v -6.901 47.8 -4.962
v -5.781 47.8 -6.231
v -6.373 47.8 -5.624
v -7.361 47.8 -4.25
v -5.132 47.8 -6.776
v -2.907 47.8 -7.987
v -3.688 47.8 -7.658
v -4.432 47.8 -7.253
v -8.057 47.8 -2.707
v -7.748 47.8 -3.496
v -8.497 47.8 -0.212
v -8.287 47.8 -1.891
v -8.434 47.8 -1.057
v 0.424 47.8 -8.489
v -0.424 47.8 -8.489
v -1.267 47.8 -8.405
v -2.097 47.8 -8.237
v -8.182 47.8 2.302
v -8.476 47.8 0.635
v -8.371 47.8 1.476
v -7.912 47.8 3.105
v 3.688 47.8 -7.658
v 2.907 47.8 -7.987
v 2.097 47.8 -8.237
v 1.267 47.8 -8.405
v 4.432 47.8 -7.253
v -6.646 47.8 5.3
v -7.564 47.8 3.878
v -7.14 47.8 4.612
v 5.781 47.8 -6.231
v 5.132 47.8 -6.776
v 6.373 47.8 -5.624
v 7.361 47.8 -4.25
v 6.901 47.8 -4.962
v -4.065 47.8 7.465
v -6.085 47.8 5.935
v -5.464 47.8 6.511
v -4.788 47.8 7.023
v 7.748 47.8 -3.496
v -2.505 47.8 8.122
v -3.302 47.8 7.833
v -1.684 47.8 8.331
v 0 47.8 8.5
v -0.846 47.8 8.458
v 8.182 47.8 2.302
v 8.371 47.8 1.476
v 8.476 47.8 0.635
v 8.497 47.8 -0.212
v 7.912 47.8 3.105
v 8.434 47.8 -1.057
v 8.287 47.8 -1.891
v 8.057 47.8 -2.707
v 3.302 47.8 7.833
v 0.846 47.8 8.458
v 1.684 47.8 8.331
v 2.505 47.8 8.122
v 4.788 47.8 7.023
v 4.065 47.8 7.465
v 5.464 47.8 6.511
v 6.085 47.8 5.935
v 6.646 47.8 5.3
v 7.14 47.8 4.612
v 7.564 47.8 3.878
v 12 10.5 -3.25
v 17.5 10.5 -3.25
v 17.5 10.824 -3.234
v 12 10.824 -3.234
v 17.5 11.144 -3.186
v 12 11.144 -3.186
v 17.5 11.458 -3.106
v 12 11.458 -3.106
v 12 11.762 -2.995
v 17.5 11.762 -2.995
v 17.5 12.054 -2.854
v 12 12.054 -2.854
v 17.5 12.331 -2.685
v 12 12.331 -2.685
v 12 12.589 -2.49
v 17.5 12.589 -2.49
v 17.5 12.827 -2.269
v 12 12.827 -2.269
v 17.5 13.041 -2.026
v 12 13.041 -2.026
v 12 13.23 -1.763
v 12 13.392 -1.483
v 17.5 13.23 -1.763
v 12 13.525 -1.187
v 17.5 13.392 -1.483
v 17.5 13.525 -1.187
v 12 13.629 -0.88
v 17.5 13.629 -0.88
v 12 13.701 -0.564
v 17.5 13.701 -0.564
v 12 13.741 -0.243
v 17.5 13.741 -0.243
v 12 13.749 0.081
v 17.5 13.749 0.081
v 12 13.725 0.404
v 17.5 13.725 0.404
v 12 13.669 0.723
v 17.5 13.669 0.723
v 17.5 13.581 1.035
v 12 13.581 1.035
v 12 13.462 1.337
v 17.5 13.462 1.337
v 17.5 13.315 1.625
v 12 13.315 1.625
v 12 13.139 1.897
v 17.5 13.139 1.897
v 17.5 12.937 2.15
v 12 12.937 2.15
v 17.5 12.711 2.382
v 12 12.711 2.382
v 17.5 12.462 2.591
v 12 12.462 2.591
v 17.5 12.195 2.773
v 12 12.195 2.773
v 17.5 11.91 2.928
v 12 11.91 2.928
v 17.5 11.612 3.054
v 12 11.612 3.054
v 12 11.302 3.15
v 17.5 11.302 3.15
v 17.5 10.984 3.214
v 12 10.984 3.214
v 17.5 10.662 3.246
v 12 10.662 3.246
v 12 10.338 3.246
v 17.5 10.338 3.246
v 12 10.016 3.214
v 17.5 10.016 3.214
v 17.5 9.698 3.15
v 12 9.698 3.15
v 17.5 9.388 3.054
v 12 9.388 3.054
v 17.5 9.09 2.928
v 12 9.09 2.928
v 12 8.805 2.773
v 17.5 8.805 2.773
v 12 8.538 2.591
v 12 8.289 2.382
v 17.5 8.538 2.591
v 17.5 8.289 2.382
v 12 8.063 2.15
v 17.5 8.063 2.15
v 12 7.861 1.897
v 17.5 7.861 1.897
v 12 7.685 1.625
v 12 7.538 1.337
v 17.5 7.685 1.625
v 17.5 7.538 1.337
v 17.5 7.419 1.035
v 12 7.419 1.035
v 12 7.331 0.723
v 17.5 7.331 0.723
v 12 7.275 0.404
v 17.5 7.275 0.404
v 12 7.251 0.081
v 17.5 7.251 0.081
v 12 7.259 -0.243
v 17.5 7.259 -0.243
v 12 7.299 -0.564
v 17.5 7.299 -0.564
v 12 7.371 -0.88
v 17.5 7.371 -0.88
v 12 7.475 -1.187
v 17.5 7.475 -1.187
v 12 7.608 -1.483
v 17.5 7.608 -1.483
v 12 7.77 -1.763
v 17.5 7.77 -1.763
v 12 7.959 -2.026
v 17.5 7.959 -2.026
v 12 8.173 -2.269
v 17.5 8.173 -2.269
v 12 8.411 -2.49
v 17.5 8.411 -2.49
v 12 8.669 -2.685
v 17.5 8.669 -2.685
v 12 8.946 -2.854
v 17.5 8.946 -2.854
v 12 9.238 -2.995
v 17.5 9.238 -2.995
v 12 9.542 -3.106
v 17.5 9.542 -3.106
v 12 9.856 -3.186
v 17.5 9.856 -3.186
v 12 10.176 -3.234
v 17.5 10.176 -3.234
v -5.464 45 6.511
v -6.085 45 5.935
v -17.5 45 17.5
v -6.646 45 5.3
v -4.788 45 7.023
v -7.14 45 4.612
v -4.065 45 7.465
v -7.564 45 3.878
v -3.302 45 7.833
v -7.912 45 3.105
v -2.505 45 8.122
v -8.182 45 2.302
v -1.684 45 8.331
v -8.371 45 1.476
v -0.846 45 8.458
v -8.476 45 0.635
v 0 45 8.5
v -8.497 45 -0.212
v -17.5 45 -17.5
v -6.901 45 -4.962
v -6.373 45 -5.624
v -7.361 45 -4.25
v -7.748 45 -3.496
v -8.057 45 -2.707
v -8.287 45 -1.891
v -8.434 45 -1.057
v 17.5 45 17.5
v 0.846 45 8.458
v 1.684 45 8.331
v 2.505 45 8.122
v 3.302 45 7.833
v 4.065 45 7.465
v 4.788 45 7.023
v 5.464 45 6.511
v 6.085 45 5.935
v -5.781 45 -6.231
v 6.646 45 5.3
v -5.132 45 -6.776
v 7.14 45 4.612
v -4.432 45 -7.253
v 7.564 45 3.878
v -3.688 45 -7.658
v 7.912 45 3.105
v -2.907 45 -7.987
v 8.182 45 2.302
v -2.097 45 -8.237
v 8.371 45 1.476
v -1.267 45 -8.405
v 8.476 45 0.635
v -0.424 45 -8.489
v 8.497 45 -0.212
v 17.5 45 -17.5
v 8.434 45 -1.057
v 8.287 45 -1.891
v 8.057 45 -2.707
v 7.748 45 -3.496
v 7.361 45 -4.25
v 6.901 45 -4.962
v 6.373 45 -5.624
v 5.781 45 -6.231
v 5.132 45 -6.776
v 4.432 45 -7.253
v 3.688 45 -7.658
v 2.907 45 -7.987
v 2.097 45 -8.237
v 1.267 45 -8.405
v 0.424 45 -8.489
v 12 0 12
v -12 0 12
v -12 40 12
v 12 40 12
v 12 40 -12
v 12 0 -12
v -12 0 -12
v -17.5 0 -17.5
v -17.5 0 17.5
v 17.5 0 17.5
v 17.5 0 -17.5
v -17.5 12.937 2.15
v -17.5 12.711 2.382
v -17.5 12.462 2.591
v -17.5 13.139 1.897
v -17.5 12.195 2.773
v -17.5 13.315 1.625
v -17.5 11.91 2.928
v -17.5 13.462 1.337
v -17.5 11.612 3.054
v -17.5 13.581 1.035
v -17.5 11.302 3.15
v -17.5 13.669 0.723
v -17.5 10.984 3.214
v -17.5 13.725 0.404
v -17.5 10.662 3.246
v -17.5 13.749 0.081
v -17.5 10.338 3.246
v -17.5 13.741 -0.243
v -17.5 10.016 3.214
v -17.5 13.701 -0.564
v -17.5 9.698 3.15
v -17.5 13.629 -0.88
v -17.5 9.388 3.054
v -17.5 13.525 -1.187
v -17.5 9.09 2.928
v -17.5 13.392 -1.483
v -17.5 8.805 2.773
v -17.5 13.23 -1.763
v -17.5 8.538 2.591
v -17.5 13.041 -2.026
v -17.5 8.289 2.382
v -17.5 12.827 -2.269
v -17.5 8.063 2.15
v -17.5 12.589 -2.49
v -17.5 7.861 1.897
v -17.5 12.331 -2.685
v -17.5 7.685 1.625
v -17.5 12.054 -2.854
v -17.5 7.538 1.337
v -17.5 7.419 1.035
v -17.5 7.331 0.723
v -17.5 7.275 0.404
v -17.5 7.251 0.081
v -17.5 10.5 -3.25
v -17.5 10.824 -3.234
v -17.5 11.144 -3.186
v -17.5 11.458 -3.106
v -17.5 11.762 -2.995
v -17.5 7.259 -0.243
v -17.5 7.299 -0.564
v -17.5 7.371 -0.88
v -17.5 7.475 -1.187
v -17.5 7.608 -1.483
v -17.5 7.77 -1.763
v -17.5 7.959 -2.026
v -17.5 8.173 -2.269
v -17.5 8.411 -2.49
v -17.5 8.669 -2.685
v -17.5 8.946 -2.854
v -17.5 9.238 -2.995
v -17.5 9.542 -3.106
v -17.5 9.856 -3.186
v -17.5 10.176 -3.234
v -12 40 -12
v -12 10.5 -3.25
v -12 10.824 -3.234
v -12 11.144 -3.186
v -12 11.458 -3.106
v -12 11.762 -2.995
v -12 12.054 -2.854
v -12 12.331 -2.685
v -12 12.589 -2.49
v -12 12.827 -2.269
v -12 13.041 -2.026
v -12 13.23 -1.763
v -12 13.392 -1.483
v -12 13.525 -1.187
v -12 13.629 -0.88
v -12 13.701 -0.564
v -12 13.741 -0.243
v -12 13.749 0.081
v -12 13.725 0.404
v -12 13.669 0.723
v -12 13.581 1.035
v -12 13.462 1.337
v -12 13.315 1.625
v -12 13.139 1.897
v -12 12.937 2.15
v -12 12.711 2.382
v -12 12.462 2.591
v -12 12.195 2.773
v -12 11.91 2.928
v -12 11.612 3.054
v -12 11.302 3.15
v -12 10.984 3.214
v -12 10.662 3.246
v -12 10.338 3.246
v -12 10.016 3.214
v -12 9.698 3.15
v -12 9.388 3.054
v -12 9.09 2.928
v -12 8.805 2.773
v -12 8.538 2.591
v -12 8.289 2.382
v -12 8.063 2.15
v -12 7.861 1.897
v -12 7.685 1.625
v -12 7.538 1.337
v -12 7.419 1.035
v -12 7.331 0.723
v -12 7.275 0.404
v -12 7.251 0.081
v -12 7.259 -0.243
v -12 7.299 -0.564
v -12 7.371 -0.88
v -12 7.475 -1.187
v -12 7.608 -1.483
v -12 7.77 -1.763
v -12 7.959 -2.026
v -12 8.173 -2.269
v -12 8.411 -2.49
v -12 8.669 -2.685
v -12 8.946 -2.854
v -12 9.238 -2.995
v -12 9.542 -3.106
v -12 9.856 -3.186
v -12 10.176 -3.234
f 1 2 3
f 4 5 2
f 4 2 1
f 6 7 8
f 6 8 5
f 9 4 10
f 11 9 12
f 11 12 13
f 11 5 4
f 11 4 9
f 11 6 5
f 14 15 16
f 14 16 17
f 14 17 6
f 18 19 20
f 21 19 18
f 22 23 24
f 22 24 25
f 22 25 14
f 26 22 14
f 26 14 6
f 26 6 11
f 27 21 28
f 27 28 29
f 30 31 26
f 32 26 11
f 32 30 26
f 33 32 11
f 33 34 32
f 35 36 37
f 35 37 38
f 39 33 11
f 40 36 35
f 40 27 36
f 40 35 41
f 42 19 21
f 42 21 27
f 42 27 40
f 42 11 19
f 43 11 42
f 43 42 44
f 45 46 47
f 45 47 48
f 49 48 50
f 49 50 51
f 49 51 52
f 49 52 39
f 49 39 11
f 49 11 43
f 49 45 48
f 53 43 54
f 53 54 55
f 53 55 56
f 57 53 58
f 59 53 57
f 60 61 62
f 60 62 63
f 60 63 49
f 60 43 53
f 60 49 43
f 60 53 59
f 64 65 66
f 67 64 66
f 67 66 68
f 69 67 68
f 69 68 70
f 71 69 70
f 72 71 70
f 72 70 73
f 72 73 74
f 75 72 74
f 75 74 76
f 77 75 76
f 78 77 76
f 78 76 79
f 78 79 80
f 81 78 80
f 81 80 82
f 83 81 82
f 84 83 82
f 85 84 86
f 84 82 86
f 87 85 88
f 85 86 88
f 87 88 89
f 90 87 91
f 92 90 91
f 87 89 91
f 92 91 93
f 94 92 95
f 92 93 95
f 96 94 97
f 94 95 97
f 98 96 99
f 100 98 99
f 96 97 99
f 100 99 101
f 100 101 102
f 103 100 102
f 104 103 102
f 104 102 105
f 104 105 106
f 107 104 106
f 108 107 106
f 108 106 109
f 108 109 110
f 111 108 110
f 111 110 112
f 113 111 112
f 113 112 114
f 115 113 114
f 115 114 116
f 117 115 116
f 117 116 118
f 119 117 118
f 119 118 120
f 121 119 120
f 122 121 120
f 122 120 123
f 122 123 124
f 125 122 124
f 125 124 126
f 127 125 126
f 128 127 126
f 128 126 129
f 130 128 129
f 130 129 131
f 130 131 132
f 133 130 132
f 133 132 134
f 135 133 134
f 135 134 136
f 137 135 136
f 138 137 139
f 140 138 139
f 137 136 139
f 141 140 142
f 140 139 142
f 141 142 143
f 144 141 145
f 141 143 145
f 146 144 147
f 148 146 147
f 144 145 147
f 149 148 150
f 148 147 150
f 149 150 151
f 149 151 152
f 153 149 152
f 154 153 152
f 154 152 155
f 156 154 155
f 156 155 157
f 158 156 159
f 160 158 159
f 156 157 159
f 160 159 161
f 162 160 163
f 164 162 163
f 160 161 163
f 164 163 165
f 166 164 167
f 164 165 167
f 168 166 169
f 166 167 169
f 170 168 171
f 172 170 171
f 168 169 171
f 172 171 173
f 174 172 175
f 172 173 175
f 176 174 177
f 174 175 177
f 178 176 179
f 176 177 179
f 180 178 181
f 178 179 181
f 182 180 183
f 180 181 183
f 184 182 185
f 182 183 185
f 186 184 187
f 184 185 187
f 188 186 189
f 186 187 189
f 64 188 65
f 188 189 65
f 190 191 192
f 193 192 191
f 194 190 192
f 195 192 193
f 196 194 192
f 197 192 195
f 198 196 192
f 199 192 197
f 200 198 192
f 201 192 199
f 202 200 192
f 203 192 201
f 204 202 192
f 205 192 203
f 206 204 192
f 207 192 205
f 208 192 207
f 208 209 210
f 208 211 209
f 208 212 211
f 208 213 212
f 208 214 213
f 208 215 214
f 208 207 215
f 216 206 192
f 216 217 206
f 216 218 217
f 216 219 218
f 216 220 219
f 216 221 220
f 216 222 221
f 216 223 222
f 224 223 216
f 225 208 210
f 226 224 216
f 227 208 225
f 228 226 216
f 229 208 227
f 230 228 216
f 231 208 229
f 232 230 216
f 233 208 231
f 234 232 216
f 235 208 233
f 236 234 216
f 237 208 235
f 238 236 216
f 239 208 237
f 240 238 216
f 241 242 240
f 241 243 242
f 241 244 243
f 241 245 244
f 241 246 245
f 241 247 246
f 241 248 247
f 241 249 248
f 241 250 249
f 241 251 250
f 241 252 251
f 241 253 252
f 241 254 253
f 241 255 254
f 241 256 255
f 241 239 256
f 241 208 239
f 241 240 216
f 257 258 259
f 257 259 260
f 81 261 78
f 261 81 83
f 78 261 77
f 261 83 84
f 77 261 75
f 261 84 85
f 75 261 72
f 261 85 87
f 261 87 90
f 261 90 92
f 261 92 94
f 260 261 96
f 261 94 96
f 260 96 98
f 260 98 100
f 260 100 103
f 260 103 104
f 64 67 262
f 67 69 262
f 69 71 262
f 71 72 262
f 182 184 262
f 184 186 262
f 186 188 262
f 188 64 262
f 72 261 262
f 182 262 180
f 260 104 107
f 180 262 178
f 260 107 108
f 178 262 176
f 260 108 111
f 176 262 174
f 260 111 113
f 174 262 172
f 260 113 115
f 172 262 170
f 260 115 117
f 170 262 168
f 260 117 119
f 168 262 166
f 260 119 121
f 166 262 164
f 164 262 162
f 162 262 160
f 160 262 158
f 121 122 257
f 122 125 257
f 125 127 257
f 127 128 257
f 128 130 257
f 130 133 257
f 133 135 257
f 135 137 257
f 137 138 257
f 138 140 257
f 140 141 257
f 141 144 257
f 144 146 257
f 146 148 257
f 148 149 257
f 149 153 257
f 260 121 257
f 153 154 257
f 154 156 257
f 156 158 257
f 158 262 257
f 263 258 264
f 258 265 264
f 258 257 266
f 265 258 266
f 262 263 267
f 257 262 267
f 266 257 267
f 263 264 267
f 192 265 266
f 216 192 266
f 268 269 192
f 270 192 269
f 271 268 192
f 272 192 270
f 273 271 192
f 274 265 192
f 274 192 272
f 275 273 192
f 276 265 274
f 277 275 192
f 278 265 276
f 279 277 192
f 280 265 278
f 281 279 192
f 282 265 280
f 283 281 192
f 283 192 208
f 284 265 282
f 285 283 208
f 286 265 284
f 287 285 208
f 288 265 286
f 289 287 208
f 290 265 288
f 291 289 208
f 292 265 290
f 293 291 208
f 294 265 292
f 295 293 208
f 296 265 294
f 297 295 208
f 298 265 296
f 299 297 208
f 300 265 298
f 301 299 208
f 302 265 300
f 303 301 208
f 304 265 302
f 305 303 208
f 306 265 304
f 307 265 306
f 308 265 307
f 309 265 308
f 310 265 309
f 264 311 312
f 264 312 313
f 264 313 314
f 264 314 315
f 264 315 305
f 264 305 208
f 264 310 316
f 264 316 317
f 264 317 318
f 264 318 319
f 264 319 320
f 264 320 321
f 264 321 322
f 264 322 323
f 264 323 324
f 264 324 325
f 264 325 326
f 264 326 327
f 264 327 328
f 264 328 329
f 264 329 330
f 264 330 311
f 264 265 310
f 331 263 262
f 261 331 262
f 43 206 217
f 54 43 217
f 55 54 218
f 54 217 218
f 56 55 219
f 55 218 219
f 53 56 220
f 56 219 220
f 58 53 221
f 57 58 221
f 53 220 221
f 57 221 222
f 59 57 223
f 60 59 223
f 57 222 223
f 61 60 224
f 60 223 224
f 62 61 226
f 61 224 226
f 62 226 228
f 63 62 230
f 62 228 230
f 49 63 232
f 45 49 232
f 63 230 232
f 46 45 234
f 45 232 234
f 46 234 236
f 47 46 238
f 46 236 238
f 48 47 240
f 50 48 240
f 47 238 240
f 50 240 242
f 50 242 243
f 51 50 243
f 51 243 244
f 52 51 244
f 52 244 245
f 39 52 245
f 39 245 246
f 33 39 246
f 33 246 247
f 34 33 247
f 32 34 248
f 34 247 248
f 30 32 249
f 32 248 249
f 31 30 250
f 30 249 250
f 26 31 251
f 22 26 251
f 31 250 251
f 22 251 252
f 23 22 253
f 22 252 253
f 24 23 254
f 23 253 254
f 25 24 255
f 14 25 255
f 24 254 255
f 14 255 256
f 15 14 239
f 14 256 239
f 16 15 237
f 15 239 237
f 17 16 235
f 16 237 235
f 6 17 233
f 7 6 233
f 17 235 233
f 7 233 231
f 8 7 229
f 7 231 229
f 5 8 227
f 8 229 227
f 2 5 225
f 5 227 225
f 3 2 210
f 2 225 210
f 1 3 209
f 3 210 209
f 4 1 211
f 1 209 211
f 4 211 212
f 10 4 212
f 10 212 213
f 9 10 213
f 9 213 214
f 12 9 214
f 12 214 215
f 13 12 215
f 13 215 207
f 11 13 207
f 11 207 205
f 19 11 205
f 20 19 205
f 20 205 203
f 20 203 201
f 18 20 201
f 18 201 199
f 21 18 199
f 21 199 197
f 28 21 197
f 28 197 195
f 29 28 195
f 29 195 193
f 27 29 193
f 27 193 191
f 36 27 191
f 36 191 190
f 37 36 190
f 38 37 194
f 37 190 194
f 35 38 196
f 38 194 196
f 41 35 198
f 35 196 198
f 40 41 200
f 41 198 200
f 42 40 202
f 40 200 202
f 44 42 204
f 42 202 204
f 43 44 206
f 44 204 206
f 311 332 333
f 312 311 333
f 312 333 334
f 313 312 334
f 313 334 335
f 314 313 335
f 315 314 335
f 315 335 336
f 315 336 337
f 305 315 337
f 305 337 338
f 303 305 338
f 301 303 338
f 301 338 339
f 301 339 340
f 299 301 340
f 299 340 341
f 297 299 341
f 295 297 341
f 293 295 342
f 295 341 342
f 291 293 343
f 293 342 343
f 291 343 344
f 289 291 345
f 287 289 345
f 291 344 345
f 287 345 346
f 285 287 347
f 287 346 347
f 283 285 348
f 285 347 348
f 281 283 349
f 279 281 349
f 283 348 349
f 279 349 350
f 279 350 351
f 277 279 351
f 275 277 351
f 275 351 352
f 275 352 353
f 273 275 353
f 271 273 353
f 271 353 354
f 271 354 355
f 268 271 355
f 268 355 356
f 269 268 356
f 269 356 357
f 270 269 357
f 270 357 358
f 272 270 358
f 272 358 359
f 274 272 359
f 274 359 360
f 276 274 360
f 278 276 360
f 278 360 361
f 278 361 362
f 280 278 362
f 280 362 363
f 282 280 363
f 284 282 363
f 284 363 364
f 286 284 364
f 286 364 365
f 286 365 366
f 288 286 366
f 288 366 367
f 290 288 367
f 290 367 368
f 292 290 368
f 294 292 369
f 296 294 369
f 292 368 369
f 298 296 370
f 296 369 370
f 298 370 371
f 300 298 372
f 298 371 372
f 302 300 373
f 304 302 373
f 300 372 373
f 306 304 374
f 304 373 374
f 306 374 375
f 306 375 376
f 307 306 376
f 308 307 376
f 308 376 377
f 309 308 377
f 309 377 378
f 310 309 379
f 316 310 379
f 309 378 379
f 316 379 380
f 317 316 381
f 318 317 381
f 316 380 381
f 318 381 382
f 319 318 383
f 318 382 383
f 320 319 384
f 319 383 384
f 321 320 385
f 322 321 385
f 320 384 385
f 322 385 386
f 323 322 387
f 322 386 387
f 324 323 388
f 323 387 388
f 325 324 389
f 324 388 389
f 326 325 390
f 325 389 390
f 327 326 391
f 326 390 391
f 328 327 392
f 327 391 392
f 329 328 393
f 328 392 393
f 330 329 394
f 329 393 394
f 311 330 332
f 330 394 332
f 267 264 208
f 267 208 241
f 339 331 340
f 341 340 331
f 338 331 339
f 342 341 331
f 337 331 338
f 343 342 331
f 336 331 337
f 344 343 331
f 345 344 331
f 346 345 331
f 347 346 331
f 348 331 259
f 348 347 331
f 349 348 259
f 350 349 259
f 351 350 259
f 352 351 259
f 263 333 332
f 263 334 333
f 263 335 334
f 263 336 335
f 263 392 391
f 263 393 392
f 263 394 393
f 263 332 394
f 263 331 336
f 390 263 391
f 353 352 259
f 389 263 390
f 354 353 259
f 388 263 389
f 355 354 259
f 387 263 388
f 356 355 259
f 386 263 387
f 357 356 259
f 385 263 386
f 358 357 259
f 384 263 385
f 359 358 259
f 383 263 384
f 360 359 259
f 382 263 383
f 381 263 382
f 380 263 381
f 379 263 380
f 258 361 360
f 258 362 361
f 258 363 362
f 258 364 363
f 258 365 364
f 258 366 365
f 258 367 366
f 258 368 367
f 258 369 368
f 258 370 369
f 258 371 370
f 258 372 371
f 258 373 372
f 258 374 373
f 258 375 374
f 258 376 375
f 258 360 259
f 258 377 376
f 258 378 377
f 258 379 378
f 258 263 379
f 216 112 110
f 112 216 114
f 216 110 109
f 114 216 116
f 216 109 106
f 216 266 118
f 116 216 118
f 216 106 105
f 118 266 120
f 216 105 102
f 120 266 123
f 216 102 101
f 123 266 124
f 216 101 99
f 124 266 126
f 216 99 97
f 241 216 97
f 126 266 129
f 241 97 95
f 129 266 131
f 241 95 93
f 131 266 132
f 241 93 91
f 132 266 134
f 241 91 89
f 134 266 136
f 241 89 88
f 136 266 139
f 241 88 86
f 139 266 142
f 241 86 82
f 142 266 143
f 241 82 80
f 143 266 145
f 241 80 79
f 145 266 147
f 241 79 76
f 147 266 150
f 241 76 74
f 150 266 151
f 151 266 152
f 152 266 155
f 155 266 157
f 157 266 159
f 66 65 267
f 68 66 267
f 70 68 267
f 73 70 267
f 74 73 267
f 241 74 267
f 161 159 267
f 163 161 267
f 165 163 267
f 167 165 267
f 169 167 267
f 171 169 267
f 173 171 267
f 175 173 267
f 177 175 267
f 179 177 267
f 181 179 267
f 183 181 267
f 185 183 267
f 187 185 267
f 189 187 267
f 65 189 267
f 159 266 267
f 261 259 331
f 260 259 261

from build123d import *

# Parameters (mm, degrees)
SKETCH_1_W          = 35
SKETCH_1_H          = 35
EXTRUDE_1_DEPTH     = 45
SKETCH_2_R          = 8.5
EXTRUDE_2_DEPTH     = 2.8
SKETCH_4_W          = 24
SKETCH_4_H          = 24
CUT_EXTRUDE_1_DEPTH = 40
SKETCH_5_R          = 3.25
CUT_EXTRUDE_2_DEPTH = 62.774509306


with BuildPart() as part:
    # 草图1 → 凸台-拉伸1 (new body)
    with BuildSketch(Plane(origin=(0, 0, 0), x_dir=(1, 0, 0), z_dir=(0, 1, 0))):
        Rectangle(SKETCH_1_W, SKETCH_1_H)
    extrude(amount=EXTRUDE_1_DEPTH)

    # 草图2 → 凸台-拉伸2 (add)
    with BuildSketch(Plane(origin=(0, 45, 0), x_dir=(1, 0, 0), z_dir=(0, 1, 0))):
        with Locations(Location((0, 0, 0), (0, 0, 270))):
            Circle(SKETCH_2_R)
    extrude(amount=EXTRUDE_2_DEPTH)

    # 草图4 → 切除-拉伸1 (cut)
    with BuildSketch(Plane.XZ):
        Rectangle(SKETCH_4_W, SKETCH_4_H)
    extrude(amount=-CUT_EXTRUDE_1_DEPTH, mode=Mode.SUBTRACT)

    # 草图5 → 切除-拉伸2 (cut, through all)
    with BuildSketch(Plane(origin=(17.5, 0, 0), x_dir=(0, 0, -1), z_dir=(1, 0, 0))):
        with Locations((0, 10.5)):
            Circle(SKETCH_5_R)
    extrude(amount=-CUT_EXTRUDE_2_DEPTH, mode=Mode.SUBTRACT)


solid = part.part
